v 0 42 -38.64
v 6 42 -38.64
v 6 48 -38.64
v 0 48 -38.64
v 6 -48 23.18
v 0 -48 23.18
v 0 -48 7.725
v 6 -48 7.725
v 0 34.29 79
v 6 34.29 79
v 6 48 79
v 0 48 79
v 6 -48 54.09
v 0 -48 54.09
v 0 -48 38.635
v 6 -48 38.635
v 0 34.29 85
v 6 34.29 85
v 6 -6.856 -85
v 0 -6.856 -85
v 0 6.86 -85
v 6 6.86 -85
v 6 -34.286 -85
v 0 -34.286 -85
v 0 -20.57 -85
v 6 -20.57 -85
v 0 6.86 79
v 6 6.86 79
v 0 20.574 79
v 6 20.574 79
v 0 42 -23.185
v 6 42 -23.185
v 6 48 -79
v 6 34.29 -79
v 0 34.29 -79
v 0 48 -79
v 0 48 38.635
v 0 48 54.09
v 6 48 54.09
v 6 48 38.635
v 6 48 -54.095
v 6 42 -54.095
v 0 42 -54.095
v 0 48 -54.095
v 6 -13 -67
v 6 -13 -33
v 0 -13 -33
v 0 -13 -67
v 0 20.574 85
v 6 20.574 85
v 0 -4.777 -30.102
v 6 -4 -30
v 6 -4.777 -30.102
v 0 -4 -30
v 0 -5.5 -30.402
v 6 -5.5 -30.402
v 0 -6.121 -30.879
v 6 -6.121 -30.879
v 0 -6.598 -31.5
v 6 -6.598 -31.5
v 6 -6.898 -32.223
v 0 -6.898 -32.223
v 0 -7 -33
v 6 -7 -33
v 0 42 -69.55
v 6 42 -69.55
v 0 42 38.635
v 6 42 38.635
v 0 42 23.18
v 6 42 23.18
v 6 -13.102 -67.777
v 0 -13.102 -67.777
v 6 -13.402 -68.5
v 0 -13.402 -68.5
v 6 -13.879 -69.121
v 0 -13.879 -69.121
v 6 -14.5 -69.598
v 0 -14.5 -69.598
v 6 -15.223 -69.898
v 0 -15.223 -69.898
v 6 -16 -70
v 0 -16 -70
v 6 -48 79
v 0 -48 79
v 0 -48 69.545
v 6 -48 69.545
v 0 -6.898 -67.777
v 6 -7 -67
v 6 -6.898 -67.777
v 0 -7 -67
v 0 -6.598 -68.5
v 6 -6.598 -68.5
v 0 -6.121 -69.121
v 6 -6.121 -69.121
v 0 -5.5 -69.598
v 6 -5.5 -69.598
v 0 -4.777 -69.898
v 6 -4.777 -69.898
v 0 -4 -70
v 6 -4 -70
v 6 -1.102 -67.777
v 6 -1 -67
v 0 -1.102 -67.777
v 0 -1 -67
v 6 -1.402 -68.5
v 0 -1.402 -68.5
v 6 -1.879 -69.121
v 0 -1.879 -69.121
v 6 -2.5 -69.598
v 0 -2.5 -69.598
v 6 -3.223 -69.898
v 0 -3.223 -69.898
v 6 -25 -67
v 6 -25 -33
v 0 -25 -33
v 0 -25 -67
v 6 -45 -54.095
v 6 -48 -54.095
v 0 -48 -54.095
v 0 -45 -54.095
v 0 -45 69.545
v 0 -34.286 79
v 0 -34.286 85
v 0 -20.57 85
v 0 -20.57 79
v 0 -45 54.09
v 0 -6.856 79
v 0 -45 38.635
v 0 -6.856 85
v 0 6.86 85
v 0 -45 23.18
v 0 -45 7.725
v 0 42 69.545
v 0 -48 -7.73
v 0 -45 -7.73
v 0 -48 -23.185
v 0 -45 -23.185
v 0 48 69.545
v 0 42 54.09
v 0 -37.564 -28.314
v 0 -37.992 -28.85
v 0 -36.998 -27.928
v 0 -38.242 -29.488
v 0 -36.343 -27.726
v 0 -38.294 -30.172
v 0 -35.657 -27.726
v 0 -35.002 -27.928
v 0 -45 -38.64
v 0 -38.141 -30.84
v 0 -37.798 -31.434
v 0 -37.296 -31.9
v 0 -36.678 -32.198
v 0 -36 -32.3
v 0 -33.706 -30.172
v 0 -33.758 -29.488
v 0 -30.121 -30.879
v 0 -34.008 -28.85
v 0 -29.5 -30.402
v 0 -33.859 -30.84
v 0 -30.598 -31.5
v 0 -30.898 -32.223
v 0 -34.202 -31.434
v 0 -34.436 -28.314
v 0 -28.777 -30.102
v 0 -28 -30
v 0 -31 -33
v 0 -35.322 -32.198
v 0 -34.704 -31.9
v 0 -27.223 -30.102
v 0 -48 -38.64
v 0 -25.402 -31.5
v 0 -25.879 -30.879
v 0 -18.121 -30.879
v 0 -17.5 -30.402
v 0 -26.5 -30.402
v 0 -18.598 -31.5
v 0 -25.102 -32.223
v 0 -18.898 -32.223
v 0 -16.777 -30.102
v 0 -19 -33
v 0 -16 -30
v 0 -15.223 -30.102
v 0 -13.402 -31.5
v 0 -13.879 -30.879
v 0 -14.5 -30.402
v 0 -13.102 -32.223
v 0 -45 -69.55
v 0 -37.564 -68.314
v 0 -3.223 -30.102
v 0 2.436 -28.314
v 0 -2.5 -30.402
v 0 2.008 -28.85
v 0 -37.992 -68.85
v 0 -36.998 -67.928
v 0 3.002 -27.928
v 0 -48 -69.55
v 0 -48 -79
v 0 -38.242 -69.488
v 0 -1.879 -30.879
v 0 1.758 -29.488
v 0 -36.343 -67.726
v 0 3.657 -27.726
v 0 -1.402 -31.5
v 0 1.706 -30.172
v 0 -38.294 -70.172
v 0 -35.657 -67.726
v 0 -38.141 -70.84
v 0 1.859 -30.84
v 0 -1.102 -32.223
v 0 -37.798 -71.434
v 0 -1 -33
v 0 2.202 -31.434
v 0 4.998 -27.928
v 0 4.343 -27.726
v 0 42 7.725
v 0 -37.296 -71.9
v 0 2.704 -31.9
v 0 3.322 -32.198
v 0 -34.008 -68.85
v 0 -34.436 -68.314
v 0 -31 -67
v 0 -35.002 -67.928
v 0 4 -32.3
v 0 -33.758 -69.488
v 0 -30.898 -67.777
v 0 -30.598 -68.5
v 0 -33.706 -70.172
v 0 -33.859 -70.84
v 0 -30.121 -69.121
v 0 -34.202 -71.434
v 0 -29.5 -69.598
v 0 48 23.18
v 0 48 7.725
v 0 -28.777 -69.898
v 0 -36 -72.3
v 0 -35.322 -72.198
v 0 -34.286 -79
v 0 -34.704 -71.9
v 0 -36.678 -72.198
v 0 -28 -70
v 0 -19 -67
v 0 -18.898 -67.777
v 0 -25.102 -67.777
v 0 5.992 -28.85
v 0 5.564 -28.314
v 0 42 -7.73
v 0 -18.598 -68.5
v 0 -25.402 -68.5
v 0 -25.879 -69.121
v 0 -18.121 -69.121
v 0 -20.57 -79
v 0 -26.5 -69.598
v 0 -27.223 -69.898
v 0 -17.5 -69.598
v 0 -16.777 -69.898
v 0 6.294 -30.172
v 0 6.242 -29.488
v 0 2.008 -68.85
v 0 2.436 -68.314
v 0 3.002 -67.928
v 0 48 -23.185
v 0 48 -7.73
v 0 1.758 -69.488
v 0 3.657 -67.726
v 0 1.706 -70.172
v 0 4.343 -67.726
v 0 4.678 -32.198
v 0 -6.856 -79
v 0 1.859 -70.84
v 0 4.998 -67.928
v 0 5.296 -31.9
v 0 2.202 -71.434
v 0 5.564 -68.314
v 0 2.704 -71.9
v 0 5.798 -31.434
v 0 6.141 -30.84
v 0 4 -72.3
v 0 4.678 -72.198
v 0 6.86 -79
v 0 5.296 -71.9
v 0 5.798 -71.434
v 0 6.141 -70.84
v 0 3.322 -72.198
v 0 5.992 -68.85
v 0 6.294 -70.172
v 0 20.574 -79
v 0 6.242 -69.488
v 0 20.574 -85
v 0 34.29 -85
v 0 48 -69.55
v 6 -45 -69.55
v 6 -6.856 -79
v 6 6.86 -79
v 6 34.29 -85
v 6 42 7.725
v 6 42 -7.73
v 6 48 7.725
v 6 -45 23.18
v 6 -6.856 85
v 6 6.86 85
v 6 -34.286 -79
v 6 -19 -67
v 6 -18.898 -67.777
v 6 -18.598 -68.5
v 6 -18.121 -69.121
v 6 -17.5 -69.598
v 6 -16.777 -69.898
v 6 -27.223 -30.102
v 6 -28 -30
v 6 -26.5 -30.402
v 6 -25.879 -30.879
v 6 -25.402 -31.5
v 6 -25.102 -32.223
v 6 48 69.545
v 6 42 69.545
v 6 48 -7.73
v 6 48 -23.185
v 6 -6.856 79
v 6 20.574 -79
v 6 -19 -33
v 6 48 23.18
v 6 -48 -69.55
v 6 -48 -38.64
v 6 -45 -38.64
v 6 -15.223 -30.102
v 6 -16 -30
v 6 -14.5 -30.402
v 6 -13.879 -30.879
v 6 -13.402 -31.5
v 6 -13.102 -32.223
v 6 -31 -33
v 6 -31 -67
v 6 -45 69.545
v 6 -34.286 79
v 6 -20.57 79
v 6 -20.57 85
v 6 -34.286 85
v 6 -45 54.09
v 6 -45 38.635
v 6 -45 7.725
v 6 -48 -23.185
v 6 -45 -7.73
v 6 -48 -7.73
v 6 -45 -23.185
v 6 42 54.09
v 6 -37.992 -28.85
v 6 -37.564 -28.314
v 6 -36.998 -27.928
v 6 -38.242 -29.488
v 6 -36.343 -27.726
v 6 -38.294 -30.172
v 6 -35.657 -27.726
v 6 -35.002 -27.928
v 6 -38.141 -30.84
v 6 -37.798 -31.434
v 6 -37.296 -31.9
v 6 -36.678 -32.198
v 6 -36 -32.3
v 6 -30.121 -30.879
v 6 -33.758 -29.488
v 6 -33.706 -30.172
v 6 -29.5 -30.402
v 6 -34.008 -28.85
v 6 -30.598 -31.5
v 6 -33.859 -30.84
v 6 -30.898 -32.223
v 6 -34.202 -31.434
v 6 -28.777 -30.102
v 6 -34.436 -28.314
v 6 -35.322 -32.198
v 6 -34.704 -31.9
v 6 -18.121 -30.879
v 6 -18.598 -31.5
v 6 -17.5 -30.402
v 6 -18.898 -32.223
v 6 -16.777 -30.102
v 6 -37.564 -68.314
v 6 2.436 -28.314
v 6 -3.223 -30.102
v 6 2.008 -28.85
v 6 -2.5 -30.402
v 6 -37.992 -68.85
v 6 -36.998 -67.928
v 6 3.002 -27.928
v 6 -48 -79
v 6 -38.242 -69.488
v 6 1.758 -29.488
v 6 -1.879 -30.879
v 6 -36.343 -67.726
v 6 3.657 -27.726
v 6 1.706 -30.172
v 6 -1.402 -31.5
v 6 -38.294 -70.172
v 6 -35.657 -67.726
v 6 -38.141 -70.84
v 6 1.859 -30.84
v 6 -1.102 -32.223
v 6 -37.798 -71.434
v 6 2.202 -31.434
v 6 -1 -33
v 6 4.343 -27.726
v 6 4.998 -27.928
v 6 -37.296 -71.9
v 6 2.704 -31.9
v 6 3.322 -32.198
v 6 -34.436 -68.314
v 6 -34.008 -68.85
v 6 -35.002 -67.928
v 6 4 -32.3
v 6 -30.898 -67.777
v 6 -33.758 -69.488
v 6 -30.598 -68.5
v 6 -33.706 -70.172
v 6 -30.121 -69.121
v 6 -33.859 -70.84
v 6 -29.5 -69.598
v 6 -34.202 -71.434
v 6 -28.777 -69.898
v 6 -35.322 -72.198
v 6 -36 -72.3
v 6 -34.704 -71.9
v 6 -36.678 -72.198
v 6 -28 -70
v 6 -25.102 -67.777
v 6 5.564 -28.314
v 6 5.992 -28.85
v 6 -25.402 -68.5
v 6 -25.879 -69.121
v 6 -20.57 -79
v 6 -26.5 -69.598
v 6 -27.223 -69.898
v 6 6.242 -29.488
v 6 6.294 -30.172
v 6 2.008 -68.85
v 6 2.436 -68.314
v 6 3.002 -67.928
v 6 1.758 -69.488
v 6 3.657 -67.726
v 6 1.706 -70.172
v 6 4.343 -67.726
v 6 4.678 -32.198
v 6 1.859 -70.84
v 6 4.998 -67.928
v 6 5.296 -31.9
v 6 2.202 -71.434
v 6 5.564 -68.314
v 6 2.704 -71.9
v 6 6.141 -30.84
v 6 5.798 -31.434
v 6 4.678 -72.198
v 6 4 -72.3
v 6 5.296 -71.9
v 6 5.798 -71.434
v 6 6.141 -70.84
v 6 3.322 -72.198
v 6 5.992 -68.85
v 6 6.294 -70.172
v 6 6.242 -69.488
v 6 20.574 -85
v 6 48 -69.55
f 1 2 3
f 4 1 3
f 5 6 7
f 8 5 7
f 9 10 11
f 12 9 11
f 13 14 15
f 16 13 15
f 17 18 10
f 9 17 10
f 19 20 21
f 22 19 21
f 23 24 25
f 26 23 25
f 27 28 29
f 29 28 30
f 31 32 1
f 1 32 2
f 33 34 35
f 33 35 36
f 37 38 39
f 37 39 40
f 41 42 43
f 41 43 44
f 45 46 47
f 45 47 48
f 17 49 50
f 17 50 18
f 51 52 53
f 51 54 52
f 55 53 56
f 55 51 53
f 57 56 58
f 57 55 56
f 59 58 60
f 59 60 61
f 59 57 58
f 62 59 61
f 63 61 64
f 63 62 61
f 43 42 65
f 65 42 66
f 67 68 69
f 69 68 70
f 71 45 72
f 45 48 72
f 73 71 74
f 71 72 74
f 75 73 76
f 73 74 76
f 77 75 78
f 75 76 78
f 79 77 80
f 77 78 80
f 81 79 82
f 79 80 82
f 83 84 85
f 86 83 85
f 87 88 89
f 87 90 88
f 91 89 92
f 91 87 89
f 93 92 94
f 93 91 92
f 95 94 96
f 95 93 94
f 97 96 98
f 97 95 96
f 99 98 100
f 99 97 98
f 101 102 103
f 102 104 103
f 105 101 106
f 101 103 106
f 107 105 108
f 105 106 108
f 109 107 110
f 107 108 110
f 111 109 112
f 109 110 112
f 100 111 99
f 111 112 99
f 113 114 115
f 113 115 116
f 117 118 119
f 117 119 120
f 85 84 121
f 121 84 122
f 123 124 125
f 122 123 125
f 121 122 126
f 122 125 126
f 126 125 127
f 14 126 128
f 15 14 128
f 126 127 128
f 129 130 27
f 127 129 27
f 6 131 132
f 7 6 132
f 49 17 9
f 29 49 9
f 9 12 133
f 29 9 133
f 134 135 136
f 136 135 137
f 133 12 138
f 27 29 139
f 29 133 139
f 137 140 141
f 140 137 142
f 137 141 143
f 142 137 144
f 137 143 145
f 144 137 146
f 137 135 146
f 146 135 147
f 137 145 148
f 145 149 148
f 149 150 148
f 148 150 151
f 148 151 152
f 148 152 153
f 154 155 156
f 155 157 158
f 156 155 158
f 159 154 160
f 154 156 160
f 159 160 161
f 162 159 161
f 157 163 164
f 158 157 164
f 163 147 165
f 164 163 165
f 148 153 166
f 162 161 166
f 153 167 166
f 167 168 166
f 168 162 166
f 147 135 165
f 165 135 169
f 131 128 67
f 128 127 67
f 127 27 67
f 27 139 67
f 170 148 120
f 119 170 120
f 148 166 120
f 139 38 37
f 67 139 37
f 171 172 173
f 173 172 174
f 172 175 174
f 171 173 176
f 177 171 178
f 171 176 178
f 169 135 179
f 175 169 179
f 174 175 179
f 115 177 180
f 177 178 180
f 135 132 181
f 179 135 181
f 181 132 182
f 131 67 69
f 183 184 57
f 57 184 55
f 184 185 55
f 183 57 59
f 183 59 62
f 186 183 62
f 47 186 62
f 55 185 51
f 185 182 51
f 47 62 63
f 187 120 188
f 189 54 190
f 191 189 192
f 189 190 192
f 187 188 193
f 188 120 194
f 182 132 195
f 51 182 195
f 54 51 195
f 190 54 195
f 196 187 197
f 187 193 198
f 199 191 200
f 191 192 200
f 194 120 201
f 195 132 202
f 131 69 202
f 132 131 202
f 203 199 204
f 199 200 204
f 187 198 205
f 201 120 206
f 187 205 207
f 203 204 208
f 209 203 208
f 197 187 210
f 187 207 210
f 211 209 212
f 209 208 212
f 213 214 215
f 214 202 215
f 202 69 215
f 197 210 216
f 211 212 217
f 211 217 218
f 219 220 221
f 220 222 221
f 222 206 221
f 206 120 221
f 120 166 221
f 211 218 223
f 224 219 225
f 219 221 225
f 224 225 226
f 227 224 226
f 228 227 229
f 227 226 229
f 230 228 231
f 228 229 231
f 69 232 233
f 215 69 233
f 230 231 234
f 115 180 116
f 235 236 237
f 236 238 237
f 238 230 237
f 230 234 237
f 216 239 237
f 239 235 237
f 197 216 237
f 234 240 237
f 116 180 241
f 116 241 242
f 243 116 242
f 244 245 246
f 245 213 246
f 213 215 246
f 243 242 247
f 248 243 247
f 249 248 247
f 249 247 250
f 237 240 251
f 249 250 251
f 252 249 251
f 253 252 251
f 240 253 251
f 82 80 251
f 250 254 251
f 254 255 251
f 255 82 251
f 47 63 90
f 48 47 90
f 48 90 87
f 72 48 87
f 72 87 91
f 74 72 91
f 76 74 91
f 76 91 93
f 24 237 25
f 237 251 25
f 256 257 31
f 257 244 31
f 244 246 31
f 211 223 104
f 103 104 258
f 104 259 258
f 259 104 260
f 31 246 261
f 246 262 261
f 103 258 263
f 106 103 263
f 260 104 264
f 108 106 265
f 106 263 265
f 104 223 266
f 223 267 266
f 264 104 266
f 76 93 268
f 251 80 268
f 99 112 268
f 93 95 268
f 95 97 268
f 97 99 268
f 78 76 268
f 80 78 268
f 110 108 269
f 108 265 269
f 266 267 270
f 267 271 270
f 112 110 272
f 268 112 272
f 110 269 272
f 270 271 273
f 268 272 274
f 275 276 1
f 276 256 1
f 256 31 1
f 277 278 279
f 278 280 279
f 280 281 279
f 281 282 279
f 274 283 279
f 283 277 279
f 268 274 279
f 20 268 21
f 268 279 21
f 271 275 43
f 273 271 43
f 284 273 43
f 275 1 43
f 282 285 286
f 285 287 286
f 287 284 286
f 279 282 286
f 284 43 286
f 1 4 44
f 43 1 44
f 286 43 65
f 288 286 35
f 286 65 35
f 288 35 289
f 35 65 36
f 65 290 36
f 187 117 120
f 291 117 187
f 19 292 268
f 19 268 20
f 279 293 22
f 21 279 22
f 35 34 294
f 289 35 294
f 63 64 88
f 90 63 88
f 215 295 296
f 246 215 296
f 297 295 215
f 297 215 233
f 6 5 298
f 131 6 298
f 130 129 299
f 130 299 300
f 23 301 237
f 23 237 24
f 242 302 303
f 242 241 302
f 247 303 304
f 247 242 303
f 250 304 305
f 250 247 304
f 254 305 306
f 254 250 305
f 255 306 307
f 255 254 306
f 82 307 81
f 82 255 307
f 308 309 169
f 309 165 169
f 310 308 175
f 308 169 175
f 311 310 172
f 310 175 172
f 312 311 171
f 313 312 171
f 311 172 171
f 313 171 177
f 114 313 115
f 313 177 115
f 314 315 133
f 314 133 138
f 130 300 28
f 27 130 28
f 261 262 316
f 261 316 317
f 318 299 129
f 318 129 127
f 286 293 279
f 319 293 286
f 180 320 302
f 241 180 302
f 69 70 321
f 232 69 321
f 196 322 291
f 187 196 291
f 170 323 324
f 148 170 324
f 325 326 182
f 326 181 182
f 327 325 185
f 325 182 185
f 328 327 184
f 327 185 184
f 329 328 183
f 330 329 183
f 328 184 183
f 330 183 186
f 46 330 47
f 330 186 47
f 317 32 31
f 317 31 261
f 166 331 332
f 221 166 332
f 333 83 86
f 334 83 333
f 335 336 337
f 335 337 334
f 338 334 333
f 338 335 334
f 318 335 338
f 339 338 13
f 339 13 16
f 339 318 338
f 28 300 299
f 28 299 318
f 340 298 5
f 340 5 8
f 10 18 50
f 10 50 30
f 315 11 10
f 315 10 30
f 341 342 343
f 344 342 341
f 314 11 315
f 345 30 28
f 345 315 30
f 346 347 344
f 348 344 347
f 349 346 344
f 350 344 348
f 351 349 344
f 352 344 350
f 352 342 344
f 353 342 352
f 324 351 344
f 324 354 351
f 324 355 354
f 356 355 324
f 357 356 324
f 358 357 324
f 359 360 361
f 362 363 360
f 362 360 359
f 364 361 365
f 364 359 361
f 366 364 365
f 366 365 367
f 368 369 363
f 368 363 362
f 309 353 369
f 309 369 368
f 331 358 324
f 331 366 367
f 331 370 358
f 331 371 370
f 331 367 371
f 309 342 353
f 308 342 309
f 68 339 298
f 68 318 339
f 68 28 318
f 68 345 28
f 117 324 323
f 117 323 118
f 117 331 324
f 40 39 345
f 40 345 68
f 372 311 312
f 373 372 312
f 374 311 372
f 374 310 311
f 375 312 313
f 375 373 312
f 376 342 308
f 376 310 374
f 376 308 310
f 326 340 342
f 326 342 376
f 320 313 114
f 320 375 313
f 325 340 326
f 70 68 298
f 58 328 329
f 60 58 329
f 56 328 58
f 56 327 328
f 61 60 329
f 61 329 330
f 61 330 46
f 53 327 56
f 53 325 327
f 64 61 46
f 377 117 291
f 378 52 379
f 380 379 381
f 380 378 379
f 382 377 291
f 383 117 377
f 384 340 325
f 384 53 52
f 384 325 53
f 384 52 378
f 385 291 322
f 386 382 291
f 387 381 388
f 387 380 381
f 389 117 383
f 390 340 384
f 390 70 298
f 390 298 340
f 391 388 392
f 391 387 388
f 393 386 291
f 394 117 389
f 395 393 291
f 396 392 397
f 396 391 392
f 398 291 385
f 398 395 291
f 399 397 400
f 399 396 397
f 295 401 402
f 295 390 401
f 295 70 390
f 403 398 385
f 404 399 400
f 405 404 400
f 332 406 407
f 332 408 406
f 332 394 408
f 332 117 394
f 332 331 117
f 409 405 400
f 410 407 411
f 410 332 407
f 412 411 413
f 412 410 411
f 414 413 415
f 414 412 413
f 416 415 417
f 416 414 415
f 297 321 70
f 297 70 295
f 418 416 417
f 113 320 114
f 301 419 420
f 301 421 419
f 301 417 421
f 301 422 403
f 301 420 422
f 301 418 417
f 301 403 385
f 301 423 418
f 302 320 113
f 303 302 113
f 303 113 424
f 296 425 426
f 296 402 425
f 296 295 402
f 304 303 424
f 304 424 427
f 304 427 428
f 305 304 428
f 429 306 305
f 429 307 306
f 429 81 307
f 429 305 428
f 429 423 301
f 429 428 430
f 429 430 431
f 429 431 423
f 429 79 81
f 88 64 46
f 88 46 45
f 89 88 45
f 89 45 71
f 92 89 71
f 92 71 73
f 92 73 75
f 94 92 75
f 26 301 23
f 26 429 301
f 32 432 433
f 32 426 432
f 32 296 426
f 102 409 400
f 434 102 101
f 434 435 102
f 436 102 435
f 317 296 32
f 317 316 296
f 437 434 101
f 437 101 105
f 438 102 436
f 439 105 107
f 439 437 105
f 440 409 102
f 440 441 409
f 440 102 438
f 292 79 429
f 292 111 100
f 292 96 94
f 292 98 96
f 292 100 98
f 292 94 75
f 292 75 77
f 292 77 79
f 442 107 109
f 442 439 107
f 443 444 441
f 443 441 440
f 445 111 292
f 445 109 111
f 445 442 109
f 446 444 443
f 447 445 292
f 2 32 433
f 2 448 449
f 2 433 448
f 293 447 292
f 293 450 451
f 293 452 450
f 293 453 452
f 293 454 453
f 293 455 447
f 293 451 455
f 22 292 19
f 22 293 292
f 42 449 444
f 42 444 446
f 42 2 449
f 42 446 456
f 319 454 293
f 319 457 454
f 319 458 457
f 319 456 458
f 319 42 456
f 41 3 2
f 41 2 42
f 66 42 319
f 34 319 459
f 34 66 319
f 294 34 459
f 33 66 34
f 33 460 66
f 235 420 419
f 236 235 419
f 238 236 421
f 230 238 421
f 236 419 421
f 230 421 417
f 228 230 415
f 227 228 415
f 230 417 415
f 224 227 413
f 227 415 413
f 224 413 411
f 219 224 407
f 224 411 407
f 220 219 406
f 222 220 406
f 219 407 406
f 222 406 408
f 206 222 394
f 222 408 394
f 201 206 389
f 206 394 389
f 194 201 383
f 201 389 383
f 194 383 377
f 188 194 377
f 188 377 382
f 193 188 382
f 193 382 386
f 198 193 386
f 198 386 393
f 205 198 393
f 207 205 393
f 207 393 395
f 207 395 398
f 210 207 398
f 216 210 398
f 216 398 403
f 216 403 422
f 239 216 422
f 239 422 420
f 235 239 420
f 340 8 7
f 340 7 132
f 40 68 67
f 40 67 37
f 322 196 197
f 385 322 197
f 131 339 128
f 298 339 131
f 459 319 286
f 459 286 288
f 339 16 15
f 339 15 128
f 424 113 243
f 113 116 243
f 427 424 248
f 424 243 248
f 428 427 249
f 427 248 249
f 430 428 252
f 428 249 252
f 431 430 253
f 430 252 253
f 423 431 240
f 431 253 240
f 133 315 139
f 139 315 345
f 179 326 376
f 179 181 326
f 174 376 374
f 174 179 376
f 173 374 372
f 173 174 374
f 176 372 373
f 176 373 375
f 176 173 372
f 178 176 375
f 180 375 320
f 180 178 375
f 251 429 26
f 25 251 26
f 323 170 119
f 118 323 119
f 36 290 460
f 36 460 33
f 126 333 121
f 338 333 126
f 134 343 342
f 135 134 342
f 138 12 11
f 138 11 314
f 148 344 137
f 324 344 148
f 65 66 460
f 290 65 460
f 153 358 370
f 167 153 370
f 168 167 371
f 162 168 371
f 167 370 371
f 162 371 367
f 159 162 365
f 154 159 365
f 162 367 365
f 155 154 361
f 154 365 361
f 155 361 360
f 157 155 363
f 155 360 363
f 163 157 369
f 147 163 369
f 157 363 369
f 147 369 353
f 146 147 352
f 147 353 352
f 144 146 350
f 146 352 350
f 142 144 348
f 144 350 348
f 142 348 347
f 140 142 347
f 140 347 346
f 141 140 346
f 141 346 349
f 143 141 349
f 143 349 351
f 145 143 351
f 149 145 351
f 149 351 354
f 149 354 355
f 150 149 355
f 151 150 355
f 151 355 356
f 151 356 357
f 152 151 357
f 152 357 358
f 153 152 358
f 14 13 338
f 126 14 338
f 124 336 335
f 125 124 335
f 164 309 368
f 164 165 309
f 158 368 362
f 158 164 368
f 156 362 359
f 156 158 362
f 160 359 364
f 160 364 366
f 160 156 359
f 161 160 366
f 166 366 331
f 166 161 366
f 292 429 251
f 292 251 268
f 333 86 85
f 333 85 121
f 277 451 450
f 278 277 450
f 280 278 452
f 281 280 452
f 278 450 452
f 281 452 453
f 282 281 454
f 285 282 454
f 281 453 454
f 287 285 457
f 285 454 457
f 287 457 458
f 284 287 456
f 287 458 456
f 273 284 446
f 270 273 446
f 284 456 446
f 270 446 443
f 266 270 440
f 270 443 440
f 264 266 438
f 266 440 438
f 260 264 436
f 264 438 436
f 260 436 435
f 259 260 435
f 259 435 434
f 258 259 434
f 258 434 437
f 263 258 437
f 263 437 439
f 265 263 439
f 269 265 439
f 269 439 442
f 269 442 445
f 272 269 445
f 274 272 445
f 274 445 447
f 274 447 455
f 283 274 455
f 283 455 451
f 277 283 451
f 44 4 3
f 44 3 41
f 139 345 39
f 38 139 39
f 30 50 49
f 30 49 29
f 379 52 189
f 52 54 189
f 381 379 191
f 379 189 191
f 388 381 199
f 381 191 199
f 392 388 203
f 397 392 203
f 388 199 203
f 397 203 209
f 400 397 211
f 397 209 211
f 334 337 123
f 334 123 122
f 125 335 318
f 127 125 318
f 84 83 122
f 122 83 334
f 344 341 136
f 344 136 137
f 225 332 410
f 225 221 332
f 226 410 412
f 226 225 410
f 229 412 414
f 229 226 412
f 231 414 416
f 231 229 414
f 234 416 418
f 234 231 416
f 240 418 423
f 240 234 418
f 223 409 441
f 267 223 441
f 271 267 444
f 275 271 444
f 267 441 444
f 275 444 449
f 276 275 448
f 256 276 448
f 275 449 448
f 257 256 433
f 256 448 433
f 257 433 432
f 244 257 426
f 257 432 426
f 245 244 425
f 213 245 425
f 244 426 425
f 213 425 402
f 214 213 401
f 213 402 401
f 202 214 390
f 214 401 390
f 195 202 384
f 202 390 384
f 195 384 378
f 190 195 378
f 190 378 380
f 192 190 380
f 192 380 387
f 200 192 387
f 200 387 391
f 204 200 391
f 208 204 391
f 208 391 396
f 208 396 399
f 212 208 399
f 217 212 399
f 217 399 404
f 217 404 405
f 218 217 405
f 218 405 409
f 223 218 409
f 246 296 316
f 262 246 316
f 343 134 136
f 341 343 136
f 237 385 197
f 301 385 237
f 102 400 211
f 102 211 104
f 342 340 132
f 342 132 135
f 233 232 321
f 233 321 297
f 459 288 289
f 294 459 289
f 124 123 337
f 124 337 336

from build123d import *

# Parameters (mm, degrees)
ESBO_O1_W                = 170
ESBO_O1_H                = 96
RESSALTO_EXTRUS_O1_DEPTH = 6
CORTE_EXTRUS_O1_REACH    = 99.801
ESBO_O2_W                = 15.455454545
ESBO_O2_H                = 6
CORTE_EXTRUS_O2_REACH    = 99.801
ESBO_O3_W                = 6
ESBO_O3_H                = 13.714285714
CORTE_EXTRUS_O3_REACH    = 99.801
ESBO_O4_W                = 40
ESBO_O4_H                = 6
ESBO_O4_R                = 2.3
FILETE1_R                = 3


with BuildPart() as part:
    # Esboço1 → Ressalto-extrusão1 (new body)
    with BuildSketch(Plane(origin=(0, 0, 0), x_dir=(0, 0, -1), z_dir=(1, 0, 0))):
        Rectangle(ESBO_O1_W, ESBO_O1_H)
    extrude(amount=RESSALTO_EXTRUS_O1_DEPTH)

    # Esboço2 → Corte-extrusão1 (cut, up to next)
    with BuildSketch(Plane(origin=(6, 0, 0), x_dir=(0, 0, -1), z_dir=(1, 0, 0)), mode=Mode.PRIVATE) as corte_extrus_o1_sk1:
        with Locations((0.002272727, 45)):
            Rectangle(ESBO_O2_W, ESBO_O2_H)
    corte_extrus_o1_tool1 = extrude(corte_extrus_o1_sk1.sketch, amount=-CORTE_EXTRUS_O1_REACH, mode=Mode.PRIVATE) & part.part
    # Esboço2 → Corte-extrusão1 (cut, up to next)
    with BuildSketch(Plane(origin=(6, 0, 0), x_dir=(0, 0, -1), z_dir=(1, 0, 0)), mode=Mode.PRIVATE) as corte_extrus_o1_sk2:
        with Locations((-30.907727273, 45)):
            Rectangle(ESBO_O2_W, ESBO_O2_H)
    corte_extrus_o1_tool2 = extrude(corte_extrus_o1_sk2.sketch, amount=-CORTE_EXTRUS_O1_REACH, mode=Mode.PRIVATE) & part.part
    # Esboço2 → Corte-extrusão1 (cut, up to next)
    with BuildSketch(Plane(origin=(6, 0, 0), x_dir=(0, 0, -1), z_dir=(1, 0, 0)), mode=Mode.PRIVATE) as corte_extrus_o1_sk3:
        with Locations((-61.817727273, 45)):
            Rectangle(ESBO_O2_W, ESBO_O2_H)
    corte_extrus_o1_tool3 = extrude(corte_extrus_o1_sk3.sketch, amount=-CORTE_EXTRUS_O1_REACH, mode=Mode.PRIVATE) & part.part
    # Esboço2 → Corte-extrusão1 (cut, up to next)
    with BuildSketch(Plane(origin=(6, 0, 0), x_dir=(0, 0, -1), z_dir=(1, 0, 0)), mode=Mode.PRIVATE) as corte_extrus_o1_sk4:
        with Locations((30.912272728, 45)):
            Rectangle(ESBO_O2_W, ESBO_O2_H)
    corte_extrus_o1_tool4 = extrude(corte_extrus_o1_sk4.sketch, amount=-CORTE_EXTRUS_O1_REACH, mode=Mode.PRIVATE) & part.part
    # Esboço2 → Corte-extrusão1 (cut, up to next)
    with BuildSketch(Plane(origin=(6, 0, 0), x_dir=(0, 0, -1), z_dir=(1, 0, 0)), mode=Mode.PRIVATE) as corte_extrus_o1_sk5:
        with Locations((61.822272728, 45)):
            Rectangle(ESBO_O2_W, ESBO_O2_H)
    corte_extrus_o1_tool5 = extrude(corte_extrus_o1_sk5.sketch, amount=-CORTE_EXTRUS_O1_REACH, mode=Mode.PRIVATE) & part.part
    # Esboço2 → Corte-extrusão1 (cut, up to next)
    with BuildSketch(Plane(origin=(6, 0, 0), x_dir=(0, 0, -1), z_dir=(1, 0, 0)), mode=Mode.PRIVATE) as corte_extrus_o1_sk6:
        with Locations((-61.817727273, -48)):
            Rectangle(ESBO_O2_W, ESBO_O2_H)
    corte_extrus_o1_tool6 = extrude(corte_extrus_o1_sk6.sketch, amount=-CORTE_EXTRUS_O1_REACH, mode=Mode.PRIVATE) & part.part
    # Esboço2 → Corte-extrusão1 (cut, up to next)
    with BuildSketch(Plane(origin=(6, 0, 0), x_dir=(0, 0, -1), z_dir=(1, 0, 0)), mode=Mode.PRIVATE) as corte_extrus_o1_sk7:
        with Locations((-30.907727273, -48)):
            Rectangle(ESBO_O2_W, ESBO_O2_H)
    corte_extrus_o1_tool7 = extrude(corte_extrus_o1_sk7.sketch, amount=-CORTE_EXTRUS_O1_REACH, mode=Mode.PRIVATE) & part.part
    # Esboço2 → Corte-extrusão1 (cut, up to next)
    with BuildSketch(Plane(origin=(6, 0, 0), x_dir=(0, 0, -1), z_dir=(1, 0, 0)), mode=Mode.PRIVATE) as corte_extrus_o1_sk8:
        with Locations((0.002272727, -48)):
            Rectangle(ESBO_O2_W, ESBO_O2_H)
    corte_extrus_o1_tool8 = extrude(corte_extrus_o1_sk8.sketch, amount=-CORTE_EXTRUS_O1_REACH, mode=Mode.PRIVATE) & part.part
    # Esboço2 → Corte-extrusão1 (cut, up to next)
    with BuildSketch(Plane(origin=(6, 0, 0), x_dir=(0, 0, -1), z_dir=(1, 0, 0)), mode=Mode.PRIVATE) as corte_extrus_o1_sk9:
        with Locations((30.912272728, -48)):
            Rectangle(ESBO_O2_W, ESBO_O2_H)
    corte_extrus_o1_tool9 = extrude(corte_extrus_o1_sk9.sketch, amount=-CORTE_EXTRUS_O1_REACH, mode=Mode.PRIVATE) & part.part
    # Esboço2 → Corte-extrusão1 (cut, up to next)
    with BuildSketch(Plane(origin=(6, 0, 0), x_dir=(0, 0, -1), z_dir=(1, 0, 0)), mode=Mode.PRIVATE) as corte_extrus_o1_sk10:
        with Locations((61.822272728, -48)):
            Rectangle(ESBO_O2_W, ESBO_O2_H)
    corte_extrus_o1_tool10 = extrude(corte_extrus_o1_sk10.sketch, amount=-CORTE_EXTRUS_O1_REACH, mode=Mode.PRIVATE) & part.part
    add(corte_extrus_o1_tool1.solids().sort_by_distance((6, 45, -0.002273))[0], mode=Mode.SUBTRACT)
    add(corte_extrus_o1_tool2.solids().sort_by_distance((6, 45, 30.907727))[0], mode=Mode.SUBTRACT)
    add(corte_extrus_o1_tool3.solids().sort_by_distance((6, 45, 61.817727))[0], mode=Mode.SUBTRACT)
    add(corte_extrus_o1_tool4.solids().sort_by_distance((6, 45, -30.912273))[0], mode=Mode.SUBTRACT)
    add(corte_extrus_o1_tool5.solids().sort_by_distance((6, 45, -61.822273))[0], mode=Mode.SUBTRACT)
    add(corte_extrus_o1_tool6.solids().sort_by_distance((6, -48, 61.817727))[0], mode=Mode.SUBTRACT)
    add(corte_extrus_o1_tool7.solids().sort_by_distance((6, -48, 30.907727))[0], mode=Mode.SUBTRACT)
    add(corte_extrus_o1_tool8.solids().sort_by_distance((6, -48, -0.002273))[0], mode=Mode.SUBTRACT)
    add(corte_extrus_o1_tool9.solids().sort_by_distance((6, -48, -30.912273))[0], mode=Mode.SUBTRACT)
    add(corte_extrus_o1_tool10.solids().sort_by_distance((6, -48, -61.822273))[0], mode=Mode.SUBTRACT)

    # Esboço3 → Corte-extrusão2 (cut, up to next)
    with BuildSketch(Plane(origin=(6, 0, 0), x_dir=(0, 0, -1), z_dir=(1, 0, 0)), mode=Mode.PRIVATE) as corte_extrus_o2_sk1:
        with Locations((82, -41.142857143)):
            Rectangle(ESBO_O3_W, ESBO_O3_H)
    corte_extrus_o2_tool1 = extrude(corte_extrus_o2_sk1.sketch, amount=-CORTE_EXTRUS_O2_REACH, mode=Mode.PRIVATE) & part.part
    # Esboço3 → Corte-extrusão2 (cut, up to next)
    with BuildSketch(Plane(origin=(6, 0, 0), x_dir=(0, 0, -1), z_dir=(1, 0, 0)), mode=Mode.PRIVATE) as corte_extrus_o2_sk2:
        with Locations((-82, -41.142857143)):
            Rectangle(ESBO_O3_W, ESBO_O3_H)
    corte_extrus_o2_tool2 = extrude(corte_extrus_o2_sk2.sketch, amount=-CORTE_EXTRUS_O2_REACH, mode=Mode.PRIVATE) & part.part
    # Esboço3 → Corte-extrusão2 (cut, up to next)
    with BuildSketch(Plane(origin=(6, 0, 0), x_dir=(0, 0, -1), z_dir=(1, 0, 0)), mode=Mode.PRIVATE) as corte_extrus_o2_sk3:
        with Locations((82, -13.712857143)):
            Rectangle(ESBO_O3_W, ESBO_O3_H)
    corte_extrus_o2_tool3 = extrude(corte_extrus_o2_sk3.sketch, amount=-CORTE_EXTRUS_O2_REACH, mode=Mode.PRIVATE) & part.part
    # Esboço3 → Corte-extrusão2 (cut, up to next)
    with BuildSketch(Plane(origin=(6, 0, 0), x_dir=(0, 0, -1), z_dir=(1, 0, 0)), mode=Mode.PRIVATE) as corte_extrus_o2_sk4:
        with Locations((82, 13.717142857)):
            Rectangle(ESBO_O3_W, ESBO_O3_H)
    corte_extrus_o2_tool4 = extrude(corte_extrus_o2_sk4.sketch, amount=-CORTE_EXTRUS_O2_REACH, mode=Mode.PRIVATE) & part.part
    # Esboço3 → Corte-extrusão2 (cut, up to next)
    with BuildSketch(Plane(origin=(6, 0, 0), x_dir=(0, 0, -1), z_dir=(1, 0, 0)), mode=Mode.PRIVATE) as corte_extrus_o2_sk5:
        with Locations((82, 41.147142857)):
            Rectangle(ESBO_O3_W, ESBO_O3_H)
    corte_extrus_o2_tool5 = extrude(corte_extrus_o2_sk5.sketch, amount=-CORTE_EXTRUS_O2_REACH, mode=Mode.PRIVATE) & part.part
    # Esboço3 → Corte-extrusão2 (cut, up to next)
    with BuildSketch(Plane(origin=(6, 0, 0), x_dir=(0, 0, -1), z_dir=(1, 0, 0)), mode=Mode.PRIVATE) as corte_extrus_o2_sk6:
        with Locations((-82, -13.712857143)):
            Rectangle(ESBO_O3_W, ESBO_O3_H)
    corte_extrus_o2_tool6 = extrude(corte_extrus_o2_sk6.sketch, amount=-CORTE_EXTRUS_O2_REACH, mode=Mode.PRIVATE) & part.part
    # Esboço3 → Corte-extrusão2 (cut, up to next)
    with BuildSketch(Plane(origin=(6, 0, 0), x_dir=(0, 0, -1), z_dir=(1, 0, 0)), mode=Mode.PRIVATE) as corte_extrus_o2_sk7:
        with Locations((-82, 13.717142857)):
            Rectangle(ESBO_O3_W, ESBO_O3_H)
    corte_extrus_o2_tool7 = extrude(corte_extrus_o2_sk7.sketch, amount=-CORTE_EXTRUS_O2_REACH, mode=Mode.PRIVATE) & part.part
    # Esboço3 → Corte-extrusão2 (cut, up to next)
    with BuildSketch(Plane(origin=(6, 0, 0), x_dir=(0, 0, -1), z_dir=(1, 0, 0)), mode=Mode.PRIVATE) as corte_extrus_o2_sk8:
        with Locations((-82, 41.147142857)):
            Rectangle(ESBO_O3_W, ESBO_O3_H)
    corte_extrus_o2_tool8 = extrude(corte_extrus_o2_sk8.sketch, amount=-CORTE_EXTRUS_O2_REACH, mode=Mode.PRIVATE) & part.part
    add(corte_extrus_o2_tool1.solids().sort_by_distance((6, -41.142857, -82))[0], mode=Mode.SUBTRACT)
    add(corte_extrus_o2_tool2.solids().sort_by_distance((6, -41.142857, 82))[0], mode=Mode.SUBTRACT)
    add(corte_extrus_o2_tool3.solids().sort_by_distance((6, -13.712857, -82))[0], mode=Mode.SUBTRACT)
    add(corte_extrus_o2_tool4.solids().sort_by_distance((6, 13.717143, -82))[0], mode=Mode.SUBTRACT)
    add(corte_extrus_o2_tool5.solids().sort_by_distance((6, 41.147143, -82))[0], mode=Mode.SUBTRACT)
    add(corte_extrus_o2_tool6.solids().sort_by_distance((6, -13.712857, 82))[0], mode=Mode.SUBTRACT)
    add(corte_extrus_o2_tool7.solids().sort_by_distance((6, 13.717143, 82))[0], mode=Mode.SUBTRACT)
    add(corte_extrus_o2_tool8.solids().sort_by_distance((6, 41.147143, 82))[0], mode=Mode.SUBTRACT)

    # Esboço4 → Corte-extrusão3 (cut, up to next)
    with BuildSketch(Plane(origin=(6, 0, 0), x_dir=(0, 0, -1), z_dir=(1, 0, 0)), mode=Mode.PRIVATE) as corte_extrus_o3_sk1:
        with Locations((50, -4)):
            Rectangle(ESBO_O4_W, ESBO_O4_H)
    corte_extrus_o3_tool1 = extrude(corte_extrus_o3_sk1.sketch, amount=-CORTE_EXTRUS_O3_REACH, mode=Mode.PRIVATE) & part.part
    # Esboço4 → Corte-extrusão3 (cut, up to next)
    with BuildSketch(Plane(origin=(6, 0, 0), x_dir=(0, 0, -1), z_dir=(1, 0, 0)), mode=Mode.PRIVATE) as corte_extrus_o3_sk2:
        with Locations((50, -16)):
            Rectangle(ESBO_O4_W, ESBO_O4_H)
    corte_extrus_o3_tool2 = extrude(corte_extrus_o3_sk2.sketch, amount=-CORTE_EXTRUS_O3_REACH, mode=Mode.PRIVATE) & part.part
    # Esboço4 → Corte-extrusão3 (cut, up to next)
    with BuildSketch(Plane(origin=(6, 0, 0), x_dir=(0, 0, -1), z_dir=(1, 0, 0)), mode=Mode.PRIVATE) as corte_extrus_o3_sk3:
        with Locations((50, -28)):
            Rectangle(ESBO_O4_W, ESBO_O4_H)
    corte_extrus_o3_tool3 = extrude(corte_extrus_o3_sk3.sketch, amount=-CORTE_EXTRUS_O3_REACH, mode=Mode.PRIVATE) & part.part
    # Esboço4 → Corte-extrusão3 (cut, up to next)
    with BuildSketch(Plane(origin=(6, 0, 0), x_dir=(0, 0, -1), z_dir=(1, 0, 0)), mode=Mode.PRIVATE) as corte_extrus_o3_sk4:
        with Locations((30, -36)):
            Circle(ESBO_O4_R)
    corte_extrus_o3_tool4 = extrude(corte_extrus_o3_sk4.sketch, amount=-CORTE_EXTRUS_O3_REACH, mode=Mode.PRIVATE) & part.part
    # Esboço4 → Corte-extrusão3 (cut, up to next)
    with BuildSketch(Plane(origin=(6, 0, 0), x_dir=(0, 0, -1), z_dir=(1, 0, 0)), mode=Mode.PRIVATE) as corte_extrus_o3_sk5:
        with Locations((70, -36)):
            Circle(ESBO_O4_R)
    corte_extrus_o3_tool5 = extrude(corte_extrus_o3_sk5.sketch, amount=-CORTE_EXTRUS_O3_REACH, mode=Mode.PRIVATE) & part.part
    # Esboço4 → Corte-extrusão3 (cut, up to next)
    with BuildSketch(Plane(origin=(6, 0, 0), x_dir=(0, 0, -1), z_dir=(1, 0, 0)), mode=Mode.PRIVATE) as corte_extrus_o3_sk6:
        with Locations((70, 4)):
            Circle(ESBO_O4_R)
    corte_extrus_o3_tool6 = extrude(corte_extrus_o3_sk6.sketch, amount=-CORTE_EXTRUS_O3_REACH, mode=Mode.PRIVATE) & part.part
    # Esboço4 → Corte-extrusão3 (cut, up to next)
    with BuildSketch(Plane(origin=(6, 0, 0), x_dir=(0, 0, -1), z_dir=(1, 0, 0)), mode=Mode.PRIVATE) as corte_extrus_o3_sk7:
        with Locations((30, 4)):
            Circle(ESBO_O4_R)
    corte_extrus_o3_tool7 = extrude(corte_extrus_o3_sk7.sketch, amount=-CORTE_EXTRUS_O3_REACH, mode=Mode.PRIVATE) & part.part
    add(corte_extrus_o3_tool1.solids().sort_by_distance((6, -4, -50))[0], mode=Mode.SUBTRACT)
    add(corte_extrus_o3_tool2.solids().sort_by_distance((6, -16, -50))[0], mode=Mode.SUBTRACT)
    add(corte_extrus_o3_tool3.solids().sort_by_distance((6, -28, -50))[0], mode=Mode.SUBTRACT)
    add(corte_extrus_o3_tool4.solids().sort_by_distance((6, -36, -30))[0], mode=Mode.SUBTRACT)
    add(corte_extrus_o3_tool5.solids().sort_by_distance((6, -36, -70))[0], mode=Mode.SUBTRACT)
    add(corte_extrus_o3_tool6.solids().sort_by_distance((6, 4, -70))[0], mode=Mode.SUBTRACT)
    add(corte_extrus_o3_tool7.solids().sort_by_distance((6, 4, -30))[0], mode=Mode.SUBTRACT)

    # Filete1
    filete1_edges = [part.edges().sort_by_distance(p)[0] for p in [
        (3, -13, -70),
        (3, -25, -70),
        (3, -13, -30),
        (3, -25, -30),
        (3, -19, -70),
        (3, -31, -70),
        (3, -31, -30),
        (3, -19, -30),
        (3, -1, -70),
        (3, -7, -70),
        (3, -7, -30),
        (3, -1, -30),
    ]]
    fillet(filete1_edges, radius=FILETE1_R - 0.0001)  # a hair under: the kernel refuses the full size


solid = part.part
